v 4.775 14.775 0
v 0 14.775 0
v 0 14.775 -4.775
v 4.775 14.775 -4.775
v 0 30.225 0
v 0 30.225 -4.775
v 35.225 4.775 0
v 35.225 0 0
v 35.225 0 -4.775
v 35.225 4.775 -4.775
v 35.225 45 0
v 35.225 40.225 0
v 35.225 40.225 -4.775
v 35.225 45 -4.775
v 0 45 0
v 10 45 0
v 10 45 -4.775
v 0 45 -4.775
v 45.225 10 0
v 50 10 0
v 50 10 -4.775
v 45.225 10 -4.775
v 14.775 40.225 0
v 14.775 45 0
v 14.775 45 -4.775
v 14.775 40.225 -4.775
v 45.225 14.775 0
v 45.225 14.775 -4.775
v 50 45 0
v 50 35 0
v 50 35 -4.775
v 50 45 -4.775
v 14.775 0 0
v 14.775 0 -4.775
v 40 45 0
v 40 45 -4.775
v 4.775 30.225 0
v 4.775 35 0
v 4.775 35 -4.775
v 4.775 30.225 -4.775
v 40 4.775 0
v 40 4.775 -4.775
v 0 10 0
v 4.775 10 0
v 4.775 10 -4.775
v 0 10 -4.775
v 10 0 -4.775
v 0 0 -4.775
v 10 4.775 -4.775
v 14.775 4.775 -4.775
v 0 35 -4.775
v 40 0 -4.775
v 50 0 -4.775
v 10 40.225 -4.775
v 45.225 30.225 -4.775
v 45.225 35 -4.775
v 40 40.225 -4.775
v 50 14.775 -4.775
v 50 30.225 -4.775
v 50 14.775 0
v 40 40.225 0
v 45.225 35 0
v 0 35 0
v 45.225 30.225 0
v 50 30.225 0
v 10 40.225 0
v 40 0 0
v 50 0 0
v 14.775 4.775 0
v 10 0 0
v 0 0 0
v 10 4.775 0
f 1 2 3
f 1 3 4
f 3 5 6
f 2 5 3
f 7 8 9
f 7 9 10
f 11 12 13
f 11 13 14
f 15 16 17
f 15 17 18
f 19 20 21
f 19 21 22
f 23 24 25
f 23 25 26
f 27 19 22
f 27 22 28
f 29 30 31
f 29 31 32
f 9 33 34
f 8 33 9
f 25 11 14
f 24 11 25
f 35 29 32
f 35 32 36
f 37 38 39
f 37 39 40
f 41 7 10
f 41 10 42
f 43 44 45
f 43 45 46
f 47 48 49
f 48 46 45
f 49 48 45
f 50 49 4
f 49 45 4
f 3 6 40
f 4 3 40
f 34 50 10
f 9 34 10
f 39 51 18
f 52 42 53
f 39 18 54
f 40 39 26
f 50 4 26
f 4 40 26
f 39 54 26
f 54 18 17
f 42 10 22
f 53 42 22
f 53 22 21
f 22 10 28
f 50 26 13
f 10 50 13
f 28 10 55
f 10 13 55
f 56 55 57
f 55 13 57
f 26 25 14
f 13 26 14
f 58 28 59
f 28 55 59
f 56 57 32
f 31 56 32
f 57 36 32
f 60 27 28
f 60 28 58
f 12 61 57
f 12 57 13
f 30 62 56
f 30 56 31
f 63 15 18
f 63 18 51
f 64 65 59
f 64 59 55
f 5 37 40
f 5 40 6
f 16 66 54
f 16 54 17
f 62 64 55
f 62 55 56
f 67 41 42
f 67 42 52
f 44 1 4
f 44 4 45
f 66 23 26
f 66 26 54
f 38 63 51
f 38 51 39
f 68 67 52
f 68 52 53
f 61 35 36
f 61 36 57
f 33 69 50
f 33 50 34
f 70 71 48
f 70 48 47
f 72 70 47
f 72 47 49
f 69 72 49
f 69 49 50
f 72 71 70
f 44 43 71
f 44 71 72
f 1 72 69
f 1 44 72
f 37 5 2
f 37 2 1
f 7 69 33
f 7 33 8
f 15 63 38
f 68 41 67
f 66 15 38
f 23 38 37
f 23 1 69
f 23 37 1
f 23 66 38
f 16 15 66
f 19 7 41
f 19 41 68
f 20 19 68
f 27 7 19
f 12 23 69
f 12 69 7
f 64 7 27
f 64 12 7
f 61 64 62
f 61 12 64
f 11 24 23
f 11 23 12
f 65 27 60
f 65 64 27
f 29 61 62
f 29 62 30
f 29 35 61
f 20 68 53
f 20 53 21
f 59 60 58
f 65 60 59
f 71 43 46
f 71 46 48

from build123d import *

# Parameters (mm, degrees)
BOSS_EXTRUDE1_DEPTH = 4.7752


with BuildPart() as part:
    # Sketch3 → Boss-Extrude1 (new body)
    with BuildSketch(Plane.XY):
        Polygon((10, 0), (10, 4.7752), (14.7752, 4.7752), (14.7752, 0), (25, 0), (35.2248, 0), (35.2248, 4.7752), (40, 4.7752), (40, 0), (50, 0), (50, 10), (45.2248, 10), (45.2248, 14.7752), (50, 14.7752), (50, 22.5), (50, 30.2248), (45.2248, 30.2248), (45.2248, 35), (50, 35), (50, 45), (40, 45), (40, 40.2248), (35.2248, 40.2248), (35.2248, 45), (14.7752, 45), (14.7752, 40.2248), (10, 40.2248), (10, 45), (0, 45), (0, 35), (4.7752, 35), (4.7752, 30.2248), (0, 30.2248), (0, 14.7752), (4.7752, 14.7752), (4.7752, 10), (0, 10), (0, 0), align=None)
    extrude(amount=-BOSS_EXTRUDE1_DEPTH)


solid = part.part
